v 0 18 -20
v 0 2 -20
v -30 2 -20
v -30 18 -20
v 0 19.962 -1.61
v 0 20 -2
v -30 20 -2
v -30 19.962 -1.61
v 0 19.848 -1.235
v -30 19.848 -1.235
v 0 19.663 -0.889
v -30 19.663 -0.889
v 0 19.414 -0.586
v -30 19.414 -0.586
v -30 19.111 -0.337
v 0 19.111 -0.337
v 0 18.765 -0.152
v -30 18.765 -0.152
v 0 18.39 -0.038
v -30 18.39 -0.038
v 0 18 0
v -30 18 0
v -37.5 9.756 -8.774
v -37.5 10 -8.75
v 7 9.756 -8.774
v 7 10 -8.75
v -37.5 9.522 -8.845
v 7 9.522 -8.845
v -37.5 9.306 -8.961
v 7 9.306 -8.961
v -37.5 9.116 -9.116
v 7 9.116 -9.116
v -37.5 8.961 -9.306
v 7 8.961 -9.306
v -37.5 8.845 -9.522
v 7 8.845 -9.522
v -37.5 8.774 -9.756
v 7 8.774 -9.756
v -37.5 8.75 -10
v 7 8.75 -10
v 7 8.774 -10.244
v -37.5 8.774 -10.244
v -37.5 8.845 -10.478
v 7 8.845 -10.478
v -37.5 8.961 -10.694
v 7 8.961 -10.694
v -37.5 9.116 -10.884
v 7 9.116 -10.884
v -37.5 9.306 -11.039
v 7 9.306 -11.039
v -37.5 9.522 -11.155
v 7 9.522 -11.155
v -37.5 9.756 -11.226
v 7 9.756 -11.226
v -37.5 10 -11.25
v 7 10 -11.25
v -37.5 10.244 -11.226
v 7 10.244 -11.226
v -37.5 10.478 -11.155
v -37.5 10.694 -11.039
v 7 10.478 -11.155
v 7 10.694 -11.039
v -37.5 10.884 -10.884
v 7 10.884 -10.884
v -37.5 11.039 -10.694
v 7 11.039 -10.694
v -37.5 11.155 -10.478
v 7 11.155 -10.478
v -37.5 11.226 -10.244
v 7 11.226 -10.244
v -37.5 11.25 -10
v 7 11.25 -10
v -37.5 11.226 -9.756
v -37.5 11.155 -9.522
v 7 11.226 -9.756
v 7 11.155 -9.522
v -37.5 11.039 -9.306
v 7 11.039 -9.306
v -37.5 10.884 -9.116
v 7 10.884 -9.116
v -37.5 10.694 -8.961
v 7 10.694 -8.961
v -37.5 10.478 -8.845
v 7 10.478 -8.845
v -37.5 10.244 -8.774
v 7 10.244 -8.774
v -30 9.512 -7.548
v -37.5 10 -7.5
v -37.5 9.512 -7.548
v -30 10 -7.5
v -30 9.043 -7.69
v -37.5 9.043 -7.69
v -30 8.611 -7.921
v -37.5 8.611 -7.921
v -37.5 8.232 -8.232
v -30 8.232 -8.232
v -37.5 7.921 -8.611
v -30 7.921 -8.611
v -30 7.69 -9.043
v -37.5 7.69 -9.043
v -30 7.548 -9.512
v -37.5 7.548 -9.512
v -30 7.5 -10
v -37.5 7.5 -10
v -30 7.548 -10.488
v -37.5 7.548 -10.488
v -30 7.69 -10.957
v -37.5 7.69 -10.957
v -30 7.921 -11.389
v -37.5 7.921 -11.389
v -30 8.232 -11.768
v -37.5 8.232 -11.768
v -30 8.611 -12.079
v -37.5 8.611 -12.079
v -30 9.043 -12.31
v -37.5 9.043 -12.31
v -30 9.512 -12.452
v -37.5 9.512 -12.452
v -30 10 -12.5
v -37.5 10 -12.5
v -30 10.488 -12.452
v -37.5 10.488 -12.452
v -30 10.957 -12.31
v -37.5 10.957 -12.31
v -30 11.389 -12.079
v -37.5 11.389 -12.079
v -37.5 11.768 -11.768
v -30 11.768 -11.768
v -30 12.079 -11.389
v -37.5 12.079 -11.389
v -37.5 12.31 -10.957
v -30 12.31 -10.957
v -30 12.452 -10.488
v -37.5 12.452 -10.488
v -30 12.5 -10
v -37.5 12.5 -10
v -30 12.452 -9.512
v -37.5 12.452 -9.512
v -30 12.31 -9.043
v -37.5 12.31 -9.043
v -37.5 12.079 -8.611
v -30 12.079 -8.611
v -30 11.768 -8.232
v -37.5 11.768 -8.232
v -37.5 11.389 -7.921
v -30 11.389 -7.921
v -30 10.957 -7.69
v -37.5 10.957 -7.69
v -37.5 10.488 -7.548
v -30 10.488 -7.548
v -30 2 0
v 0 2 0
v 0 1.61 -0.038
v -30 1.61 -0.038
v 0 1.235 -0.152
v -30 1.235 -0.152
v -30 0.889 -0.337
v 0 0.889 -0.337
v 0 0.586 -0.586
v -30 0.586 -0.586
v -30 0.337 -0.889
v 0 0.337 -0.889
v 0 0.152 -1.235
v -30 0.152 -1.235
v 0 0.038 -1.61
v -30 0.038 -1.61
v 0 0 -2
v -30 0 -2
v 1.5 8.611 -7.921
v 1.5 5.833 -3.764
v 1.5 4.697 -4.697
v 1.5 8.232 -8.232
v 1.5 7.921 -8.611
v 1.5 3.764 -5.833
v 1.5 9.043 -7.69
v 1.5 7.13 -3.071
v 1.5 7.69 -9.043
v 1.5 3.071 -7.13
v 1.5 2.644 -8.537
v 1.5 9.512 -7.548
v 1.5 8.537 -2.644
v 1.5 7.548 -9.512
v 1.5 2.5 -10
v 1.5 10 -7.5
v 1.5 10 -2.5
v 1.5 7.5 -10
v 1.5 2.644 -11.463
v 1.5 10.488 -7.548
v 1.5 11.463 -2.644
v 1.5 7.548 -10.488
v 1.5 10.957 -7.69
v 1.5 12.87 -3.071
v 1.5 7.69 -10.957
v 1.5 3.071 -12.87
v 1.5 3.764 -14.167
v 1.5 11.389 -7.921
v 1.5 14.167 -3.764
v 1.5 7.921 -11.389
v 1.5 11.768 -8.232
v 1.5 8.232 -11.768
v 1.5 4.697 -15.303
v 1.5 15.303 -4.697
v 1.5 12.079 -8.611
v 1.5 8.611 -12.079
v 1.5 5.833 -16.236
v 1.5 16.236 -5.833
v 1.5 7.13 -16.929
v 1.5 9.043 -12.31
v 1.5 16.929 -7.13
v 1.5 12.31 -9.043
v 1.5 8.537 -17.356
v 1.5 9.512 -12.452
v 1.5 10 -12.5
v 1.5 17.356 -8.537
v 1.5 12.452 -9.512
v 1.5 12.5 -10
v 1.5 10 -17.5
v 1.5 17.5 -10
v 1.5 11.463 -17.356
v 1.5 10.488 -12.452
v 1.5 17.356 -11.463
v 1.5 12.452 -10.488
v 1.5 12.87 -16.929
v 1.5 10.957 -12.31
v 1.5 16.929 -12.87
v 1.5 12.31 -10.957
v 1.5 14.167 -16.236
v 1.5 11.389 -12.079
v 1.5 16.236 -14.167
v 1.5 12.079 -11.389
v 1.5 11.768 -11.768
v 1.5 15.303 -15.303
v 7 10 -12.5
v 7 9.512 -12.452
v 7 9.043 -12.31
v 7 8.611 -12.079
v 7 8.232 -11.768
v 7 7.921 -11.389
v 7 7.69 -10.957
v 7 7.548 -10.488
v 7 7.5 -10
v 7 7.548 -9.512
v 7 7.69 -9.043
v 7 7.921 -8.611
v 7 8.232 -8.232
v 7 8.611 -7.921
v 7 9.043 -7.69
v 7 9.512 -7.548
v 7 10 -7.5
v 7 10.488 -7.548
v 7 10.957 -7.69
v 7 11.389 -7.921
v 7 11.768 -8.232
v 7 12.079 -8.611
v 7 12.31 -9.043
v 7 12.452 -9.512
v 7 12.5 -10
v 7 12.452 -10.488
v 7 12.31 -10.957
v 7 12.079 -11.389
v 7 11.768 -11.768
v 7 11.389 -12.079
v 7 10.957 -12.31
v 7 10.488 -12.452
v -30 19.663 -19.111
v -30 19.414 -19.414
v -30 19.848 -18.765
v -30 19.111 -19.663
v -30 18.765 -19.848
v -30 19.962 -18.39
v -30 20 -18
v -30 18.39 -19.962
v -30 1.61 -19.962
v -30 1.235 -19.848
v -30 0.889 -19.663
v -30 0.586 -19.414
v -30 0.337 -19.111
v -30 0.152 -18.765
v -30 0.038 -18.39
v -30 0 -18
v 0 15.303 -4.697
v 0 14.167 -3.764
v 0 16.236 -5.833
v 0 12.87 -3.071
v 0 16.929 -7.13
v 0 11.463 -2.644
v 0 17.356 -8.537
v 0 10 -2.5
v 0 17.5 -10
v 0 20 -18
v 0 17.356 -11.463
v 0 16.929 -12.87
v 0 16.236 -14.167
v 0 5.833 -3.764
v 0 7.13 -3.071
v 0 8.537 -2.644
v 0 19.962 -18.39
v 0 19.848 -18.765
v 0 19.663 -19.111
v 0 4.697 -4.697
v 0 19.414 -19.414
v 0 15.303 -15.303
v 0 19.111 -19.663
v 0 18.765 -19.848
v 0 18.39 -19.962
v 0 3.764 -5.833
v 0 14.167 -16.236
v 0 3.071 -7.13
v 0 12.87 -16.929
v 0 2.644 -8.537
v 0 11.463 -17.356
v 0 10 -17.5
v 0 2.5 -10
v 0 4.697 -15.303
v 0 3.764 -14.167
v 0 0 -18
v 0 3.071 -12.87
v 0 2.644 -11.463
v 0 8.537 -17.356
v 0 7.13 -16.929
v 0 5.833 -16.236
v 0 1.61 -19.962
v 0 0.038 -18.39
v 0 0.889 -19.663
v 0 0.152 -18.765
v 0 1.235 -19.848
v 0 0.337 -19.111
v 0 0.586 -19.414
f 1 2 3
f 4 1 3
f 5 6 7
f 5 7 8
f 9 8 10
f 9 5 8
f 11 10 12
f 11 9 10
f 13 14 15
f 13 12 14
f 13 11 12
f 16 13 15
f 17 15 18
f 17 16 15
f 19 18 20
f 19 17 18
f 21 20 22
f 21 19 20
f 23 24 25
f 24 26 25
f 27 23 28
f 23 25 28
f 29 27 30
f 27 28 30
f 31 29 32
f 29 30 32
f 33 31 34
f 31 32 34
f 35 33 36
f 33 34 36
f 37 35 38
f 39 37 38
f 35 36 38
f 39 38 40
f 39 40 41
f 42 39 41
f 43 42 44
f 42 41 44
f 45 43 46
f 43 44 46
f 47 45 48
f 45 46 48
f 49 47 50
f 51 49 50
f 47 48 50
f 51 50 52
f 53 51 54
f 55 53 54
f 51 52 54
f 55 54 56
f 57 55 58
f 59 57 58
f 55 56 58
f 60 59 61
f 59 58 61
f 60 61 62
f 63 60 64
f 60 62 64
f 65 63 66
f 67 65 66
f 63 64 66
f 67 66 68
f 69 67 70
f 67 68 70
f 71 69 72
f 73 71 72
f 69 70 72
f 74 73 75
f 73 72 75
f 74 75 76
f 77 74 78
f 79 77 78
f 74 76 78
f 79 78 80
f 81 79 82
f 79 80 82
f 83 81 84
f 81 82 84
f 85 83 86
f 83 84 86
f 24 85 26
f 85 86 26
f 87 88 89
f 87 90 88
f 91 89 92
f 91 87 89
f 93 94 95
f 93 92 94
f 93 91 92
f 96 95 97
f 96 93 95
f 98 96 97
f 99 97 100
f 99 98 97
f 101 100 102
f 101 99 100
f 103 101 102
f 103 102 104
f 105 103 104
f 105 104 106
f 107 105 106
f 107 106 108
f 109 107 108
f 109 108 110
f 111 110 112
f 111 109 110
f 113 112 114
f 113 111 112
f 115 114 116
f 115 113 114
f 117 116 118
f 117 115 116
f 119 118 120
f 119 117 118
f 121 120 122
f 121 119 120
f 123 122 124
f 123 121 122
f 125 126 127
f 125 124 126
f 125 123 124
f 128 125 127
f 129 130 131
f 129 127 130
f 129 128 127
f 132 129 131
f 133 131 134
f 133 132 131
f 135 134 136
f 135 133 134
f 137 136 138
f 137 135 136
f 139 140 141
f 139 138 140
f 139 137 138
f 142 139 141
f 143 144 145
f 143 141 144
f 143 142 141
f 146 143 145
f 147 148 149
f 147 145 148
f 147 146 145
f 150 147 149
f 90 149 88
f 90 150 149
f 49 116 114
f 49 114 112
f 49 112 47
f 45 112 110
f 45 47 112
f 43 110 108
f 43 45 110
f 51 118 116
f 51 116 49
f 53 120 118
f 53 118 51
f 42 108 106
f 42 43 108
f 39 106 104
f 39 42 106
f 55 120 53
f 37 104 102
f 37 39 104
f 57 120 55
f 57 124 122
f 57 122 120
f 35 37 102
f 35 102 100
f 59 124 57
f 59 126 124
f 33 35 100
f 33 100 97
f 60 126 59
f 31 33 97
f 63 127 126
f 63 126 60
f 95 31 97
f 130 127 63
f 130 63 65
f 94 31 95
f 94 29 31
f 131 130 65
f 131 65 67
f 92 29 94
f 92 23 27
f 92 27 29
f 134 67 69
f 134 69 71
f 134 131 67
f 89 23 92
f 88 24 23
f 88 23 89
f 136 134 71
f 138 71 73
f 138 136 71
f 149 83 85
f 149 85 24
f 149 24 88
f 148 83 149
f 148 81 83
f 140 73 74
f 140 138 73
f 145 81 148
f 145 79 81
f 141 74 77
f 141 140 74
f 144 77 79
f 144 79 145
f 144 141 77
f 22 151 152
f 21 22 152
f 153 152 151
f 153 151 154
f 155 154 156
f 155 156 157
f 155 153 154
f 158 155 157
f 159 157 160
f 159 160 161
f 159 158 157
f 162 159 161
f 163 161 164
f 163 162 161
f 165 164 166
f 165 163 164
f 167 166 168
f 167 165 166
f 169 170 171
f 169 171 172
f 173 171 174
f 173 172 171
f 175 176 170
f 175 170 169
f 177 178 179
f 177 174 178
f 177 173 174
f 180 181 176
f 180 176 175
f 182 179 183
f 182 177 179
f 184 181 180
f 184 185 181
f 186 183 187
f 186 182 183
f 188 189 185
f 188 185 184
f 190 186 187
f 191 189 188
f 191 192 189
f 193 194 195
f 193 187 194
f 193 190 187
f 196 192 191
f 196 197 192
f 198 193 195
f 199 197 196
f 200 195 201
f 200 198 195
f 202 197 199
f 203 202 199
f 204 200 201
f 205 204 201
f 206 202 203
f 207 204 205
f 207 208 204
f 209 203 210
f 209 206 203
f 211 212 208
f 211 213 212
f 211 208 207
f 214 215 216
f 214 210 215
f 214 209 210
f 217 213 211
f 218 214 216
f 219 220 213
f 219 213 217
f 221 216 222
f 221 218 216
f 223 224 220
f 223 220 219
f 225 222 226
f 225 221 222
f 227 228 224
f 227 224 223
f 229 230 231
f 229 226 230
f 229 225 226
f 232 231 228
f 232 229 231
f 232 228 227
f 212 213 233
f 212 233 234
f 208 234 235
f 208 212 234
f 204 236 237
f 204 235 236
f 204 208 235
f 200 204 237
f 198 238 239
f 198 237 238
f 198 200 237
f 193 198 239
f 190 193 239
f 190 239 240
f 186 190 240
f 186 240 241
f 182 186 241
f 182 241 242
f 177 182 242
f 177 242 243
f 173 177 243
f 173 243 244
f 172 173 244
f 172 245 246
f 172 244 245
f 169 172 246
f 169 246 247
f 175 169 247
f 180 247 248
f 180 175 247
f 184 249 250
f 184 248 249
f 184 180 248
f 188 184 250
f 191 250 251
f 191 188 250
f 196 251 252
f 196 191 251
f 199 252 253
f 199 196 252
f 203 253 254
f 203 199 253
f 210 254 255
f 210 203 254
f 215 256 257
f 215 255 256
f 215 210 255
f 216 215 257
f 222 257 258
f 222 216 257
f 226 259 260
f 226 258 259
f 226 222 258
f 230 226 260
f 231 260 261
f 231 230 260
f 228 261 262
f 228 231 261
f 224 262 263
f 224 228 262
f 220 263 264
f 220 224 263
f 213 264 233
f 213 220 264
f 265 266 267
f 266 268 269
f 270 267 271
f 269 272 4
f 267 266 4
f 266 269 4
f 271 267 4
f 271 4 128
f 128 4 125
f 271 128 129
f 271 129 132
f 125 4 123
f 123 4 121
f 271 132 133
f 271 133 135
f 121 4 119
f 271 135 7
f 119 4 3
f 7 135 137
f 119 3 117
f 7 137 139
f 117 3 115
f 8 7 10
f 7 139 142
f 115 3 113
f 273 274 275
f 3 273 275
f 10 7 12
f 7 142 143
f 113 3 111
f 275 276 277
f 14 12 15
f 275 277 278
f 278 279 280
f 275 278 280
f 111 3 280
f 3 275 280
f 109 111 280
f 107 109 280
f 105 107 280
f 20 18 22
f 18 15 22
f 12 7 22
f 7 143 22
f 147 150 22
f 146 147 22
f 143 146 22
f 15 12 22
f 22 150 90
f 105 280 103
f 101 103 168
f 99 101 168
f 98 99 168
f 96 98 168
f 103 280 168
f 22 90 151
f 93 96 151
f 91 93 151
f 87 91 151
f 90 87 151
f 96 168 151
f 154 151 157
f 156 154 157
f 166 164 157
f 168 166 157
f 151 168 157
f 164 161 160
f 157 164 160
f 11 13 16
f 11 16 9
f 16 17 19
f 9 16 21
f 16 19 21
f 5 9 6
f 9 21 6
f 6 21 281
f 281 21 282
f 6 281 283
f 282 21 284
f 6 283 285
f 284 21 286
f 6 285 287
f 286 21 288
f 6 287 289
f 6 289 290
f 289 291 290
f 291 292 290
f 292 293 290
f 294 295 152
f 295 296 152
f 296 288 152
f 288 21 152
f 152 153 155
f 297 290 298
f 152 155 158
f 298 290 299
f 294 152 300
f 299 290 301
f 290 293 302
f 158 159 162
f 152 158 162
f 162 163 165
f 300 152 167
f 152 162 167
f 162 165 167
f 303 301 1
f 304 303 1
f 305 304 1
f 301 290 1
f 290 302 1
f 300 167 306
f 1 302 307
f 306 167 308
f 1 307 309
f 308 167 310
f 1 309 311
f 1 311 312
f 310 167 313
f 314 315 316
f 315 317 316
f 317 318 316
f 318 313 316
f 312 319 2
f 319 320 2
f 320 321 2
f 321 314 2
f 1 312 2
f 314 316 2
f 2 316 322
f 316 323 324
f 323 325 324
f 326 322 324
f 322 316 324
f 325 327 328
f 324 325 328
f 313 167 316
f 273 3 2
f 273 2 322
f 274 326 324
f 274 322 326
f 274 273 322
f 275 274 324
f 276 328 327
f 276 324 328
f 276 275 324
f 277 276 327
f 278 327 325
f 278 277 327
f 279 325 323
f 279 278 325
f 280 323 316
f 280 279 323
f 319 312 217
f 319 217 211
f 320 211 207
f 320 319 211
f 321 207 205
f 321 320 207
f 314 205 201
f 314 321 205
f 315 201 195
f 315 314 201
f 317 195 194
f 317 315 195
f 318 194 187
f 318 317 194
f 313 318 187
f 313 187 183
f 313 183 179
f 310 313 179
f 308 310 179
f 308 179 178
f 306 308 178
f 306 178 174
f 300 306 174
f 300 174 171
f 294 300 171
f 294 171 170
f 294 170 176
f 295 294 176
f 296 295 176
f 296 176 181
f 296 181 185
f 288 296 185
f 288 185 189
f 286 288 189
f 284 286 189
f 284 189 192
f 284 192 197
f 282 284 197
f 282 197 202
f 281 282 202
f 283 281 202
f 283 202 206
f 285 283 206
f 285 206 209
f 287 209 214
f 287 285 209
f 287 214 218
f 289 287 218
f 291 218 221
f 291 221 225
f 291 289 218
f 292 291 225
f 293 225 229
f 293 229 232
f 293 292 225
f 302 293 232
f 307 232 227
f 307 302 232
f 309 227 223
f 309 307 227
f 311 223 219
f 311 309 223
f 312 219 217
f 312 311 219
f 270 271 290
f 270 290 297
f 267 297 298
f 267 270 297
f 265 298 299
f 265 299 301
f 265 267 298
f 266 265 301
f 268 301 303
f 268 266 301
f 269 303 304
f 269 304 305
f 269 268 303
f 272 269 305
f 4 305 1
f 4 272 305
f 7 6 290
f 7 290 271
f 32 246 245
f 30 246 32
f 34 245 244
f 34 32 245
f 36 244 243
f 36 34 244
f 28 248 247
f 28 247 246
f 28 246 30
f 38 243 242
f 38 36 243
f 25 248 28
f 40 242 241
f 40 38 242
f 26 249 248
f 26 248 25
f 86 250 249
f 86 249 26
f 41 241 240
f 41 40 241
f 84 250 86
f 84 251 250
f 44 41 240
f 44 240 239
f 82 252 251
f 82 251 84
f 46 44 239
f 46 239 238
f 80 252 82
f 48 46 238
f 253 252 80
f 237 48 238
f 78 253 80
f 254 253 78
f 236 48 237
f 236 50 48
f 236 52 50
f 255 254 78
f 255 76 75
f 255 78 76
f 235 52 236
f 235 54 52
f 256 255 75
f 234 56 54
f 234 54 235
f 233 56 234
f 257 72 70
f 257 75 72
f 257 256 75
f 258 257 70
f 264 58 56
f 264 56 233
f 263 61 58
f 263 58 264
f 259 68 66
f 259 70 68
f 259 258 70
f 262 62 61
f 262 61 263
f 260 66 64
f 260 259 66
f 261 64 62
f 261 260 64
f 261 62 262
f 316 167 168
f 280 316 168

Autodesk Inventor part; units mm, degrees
ref_plane "YZ Plane" through (0, 0, 0) normal (1, 0, 0) x (0, 1, 0)
ref_plane "XZ Plane" through (0, 0, 0) normal (0, 1, 0) x (-1, 0, 0)
sketch "Sketch1" plane through (0, 0, 0) normal (0, 1, 0) x (-1, 0, 0)
  line L0 (0, 0) -> (0, -20)
  line L1 (0, -20) -> (30, -20)
  line L2 (30, -20) -> (30, 0)
  line L3 (30, 0) -> (0, 0)
  dimension "d0" = 20
  dimension "d1" = 30
  dimension "d2" = 20
extrude "Extrusion1" add sketch "Sketch1" along normal blind 20
sketch "Sketch2" plane through (0, 0, 0) normal (1, 0, 0) x (0, 0, -1)
  line L0 (0, 0) -> (20, 0) projected
  line L1 (10, 0) -> (10, 10)
  circle A0 centre (10, 10) radius 7.5
  dimension "d5" = 10
  dimension "d6" = 15
extrude "Extrusion2" add sketch "Sketch2" along normal blind 1.5
sketch "Sketch3" plane through (1.5, 10, -10) normal (1, 0, 0) x (0, 0, -1)
  circle A0 centre (0, 0) radius 2.5
  point P0 (-10, -10)
  dimension "d9" = 5
extrude "Extrusion4" add sketch "Sketch3" along normal blind 5.5
sketch "Sketch4" plane through (-30, 0, -20) normal (-1, 0, 0) x (0, 0, 1)
  line L0 (20, 0) -> (0, 0) projected
  circle A0 centre (10, 10) radius 2.5 projected
  circle A1 centre (10, 10) radius 2.5
  dimension "d16" = 5
extrude "Extrusion5" add sketch "Sketch4" along normal blind 7.5
sketch "Sketch5" plane through (-37.5, 10, -10) normal (-1, 0, 0) x (0, 0, 1)
  circle A0 centre (0, 0) radius 2.5
  point P0 (10, -10)
  dimension "d19" = 5
hole "Hole1" at (-37.5, 10, -10) direction (1, 0, 0) diameter 2.5 end through all
fillet "Fillet1" radius 2 4 edges at (-15, 20, -20) (-15, 20, 0) (-15, 0, -20) (-15, 0, 0)
ref_plane "Work Plane1" through (7, 10, -10) normal (1, 0, 0) x (0, 0, -1)
properties part number "NEMA8"
